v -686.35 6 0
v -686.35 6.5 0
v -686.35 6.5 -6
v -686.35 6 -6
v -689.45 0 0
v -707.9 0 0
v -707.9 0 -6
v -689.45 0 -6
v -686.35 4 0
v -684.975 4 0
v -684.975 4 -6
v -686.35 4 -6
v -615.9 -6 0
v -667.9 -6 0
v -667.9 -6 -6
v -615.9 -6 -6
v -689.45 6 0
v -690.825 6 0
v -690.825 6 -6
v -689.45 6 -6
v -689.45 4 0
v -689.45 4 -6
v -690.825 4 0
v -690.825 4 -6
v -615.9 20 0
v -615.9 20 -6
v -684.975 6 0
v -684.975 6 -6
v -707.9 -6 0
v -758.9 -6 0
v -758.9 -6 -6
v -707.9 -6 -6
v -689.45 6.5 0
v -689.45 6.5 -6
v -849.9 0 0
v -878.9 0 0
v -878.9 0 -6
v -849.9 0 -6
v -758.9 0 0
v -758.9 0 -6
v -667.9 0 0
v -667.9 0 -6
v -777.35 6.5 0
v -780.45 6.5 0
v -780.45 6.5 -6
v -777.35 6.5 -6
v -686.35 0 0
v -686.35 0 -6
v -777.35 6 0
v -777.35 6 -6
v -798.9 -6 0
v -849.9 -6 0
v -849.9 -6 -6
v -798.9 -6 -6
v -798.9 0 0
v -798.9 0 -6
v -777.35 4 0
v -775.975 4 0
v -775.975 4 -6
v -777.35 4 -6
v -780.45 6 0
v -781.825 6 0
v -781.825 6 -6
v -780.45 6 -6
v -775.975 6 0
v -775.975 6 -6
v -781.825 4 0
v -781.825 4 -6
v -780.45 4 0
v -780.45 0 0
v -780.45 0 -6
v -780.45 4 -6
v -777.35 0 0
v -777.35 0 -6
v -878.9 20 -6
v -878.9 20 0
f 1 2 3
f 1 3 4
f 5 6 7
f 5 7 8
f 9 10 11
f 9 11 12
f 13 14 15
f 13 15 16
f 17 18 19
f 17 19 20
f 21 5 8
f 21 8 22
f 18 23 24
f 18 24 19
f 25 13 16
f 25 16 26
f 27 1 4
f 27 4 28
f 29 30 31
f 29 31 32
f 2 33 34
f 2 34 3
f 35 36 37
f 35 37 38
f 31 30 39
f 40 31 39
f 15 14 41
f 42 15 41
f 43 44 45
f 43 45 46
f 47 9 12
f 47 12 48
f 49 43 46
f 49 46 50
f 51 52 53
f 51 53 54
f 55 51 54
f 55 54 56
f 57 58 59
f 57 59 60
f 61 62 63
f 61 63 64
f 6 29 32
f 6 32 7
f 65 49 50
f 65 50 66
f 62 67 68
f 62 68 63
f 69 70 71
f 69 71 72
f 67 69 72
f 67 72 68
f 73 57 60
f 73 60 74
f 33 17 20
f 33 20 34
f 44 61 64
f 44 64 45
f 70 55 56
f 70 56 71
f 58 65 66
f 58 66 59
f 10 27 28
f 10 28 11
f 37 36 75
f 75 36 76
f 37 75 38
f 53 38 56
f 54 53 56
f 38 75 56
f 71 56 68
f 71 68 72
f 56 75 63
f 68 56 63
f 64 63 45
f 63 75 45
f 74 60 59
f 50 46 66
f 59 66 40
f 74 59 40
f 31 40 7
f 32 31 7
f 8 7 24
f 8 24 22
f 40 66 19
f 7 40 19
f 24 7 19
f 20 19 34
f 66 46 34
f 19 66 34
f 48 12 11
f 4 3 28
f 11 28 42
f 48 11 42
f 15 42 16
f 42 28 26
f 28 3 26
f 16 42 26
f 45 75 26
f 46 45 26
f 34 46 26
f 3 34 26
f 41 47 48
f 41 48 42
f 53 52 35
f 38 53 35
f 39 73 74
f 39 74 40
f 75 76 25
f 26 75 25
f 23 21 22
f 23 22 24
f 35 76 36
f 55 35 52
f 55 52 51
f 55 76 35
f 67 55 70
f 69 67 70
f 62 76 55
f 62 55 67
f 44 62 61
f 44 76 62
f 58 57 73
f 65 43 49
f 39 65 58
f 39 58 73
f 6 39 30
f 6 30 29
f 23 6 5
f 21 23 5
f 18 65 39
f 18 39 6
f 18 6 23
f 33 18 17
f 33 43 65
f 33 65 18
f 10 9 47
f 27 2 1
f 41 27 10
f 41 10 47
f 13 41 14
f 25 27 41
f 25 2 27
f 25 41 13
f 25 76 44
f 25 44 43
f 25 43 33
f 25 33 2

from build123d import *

# Parameters (mm, degrees)
SZKIC1_W                    = 264
SZKIC1_H                    = 26
DODANIE_WYCI_GNI_CIE1_DEPTH = 6
SZKIC5_W                    = 40
SZKIC5_H                    = 6
WYTNIJ_WYCI_GNI_CIE3_DEPTH  = 6
SZYK_LINIOWY1_COUNT         = 3
SZYK_LINIOWY1_PITCH         = 91
WYTNIJ_WYCI_GNI_CIE4_DEPTH  = 6
SZYK_LINIOWY2_COUNT         = 2
SZYK_LINIOWY2_PITCH         = 91
PRZENIE_CIAN_1_BY           = 1


with BuildPart() as part:
    # Szkic1 → Dodanie-wyciągnięcie1 (new body)
    with BuildSketch(Plane.XY):
        with Locations((-747.9, 7)):
            Rectangle(SZKIC1_W, SZKIC1_H)
    extrude(amount=-DODANIE_WYCI_GNI_CIE1_DEPTH)

    # Szkic5 → Wytnij-wyciągnięcie3 (cut)
    with BuildSketch(Plane.XY):
        with Locations((-869.9, -3)):
            Rectangle(SZKIC5_W, SZKIC5_H)
    wytnij_wyci_gni_cie3 = extrude(amount=-WYTNIJ_WYCI_GNI_CIE3_DEPTH, mode=Mode.SUBTRACT)

    # Szyk liniowy1: Wytnij-wyciągnięcie3 ×3
    with Locations(*[(i * SZYK_LINIOWY1_PITCH, 0, 0) for i in range(1, SZYK_LINIOWY1_COUNT)]):
        add(wytnij_wyci_gni_cie3, mode=Mode.SUBTRACT)

    # Szkic6 → Wytnij-wyciągnięcie4 (cut)
    with BuildSketch(Plane.XY):
        Polygon((-777.35, 0), (-780.45, 0), (-780.45, 4), (-781.825, 4), (-781.825, 6), (-780.45, 6), (-780.45, 6.5), (-777.35, 6.5), (-777.35, 6), (-775.975, 6), (-775.975, 4), (-777.35, 4), align=None)
    wytnij_wyci_gni_cie4 = extrude(amount=-WYTNIJ_WYCI_GNI_CIE4_DEPTH, mode=Mode.SUBTRACT)

    # Szyk liniowy2: Wytnij-wyciągnięcie4 ×2
    with Locations(*[(i * SZYK_LINIOWY2_PITCH, 0, 0) for i in range(1, SZYK_LINIOWY2_COUNT)]):
        add(wytnij_wyci_gni_cie4, mode=Mode.SUBTRACT)

    # Przenieś ścianę1: a face moved inward by 1.0
    extrude(part.faces().sort_by_distance((-879.9, 10, -3))[0], amount=PRZENIE_CIAN_1_BY, dir=(1, 0, 0), mode=Mode.SUBTRACT)


solid = part.part
